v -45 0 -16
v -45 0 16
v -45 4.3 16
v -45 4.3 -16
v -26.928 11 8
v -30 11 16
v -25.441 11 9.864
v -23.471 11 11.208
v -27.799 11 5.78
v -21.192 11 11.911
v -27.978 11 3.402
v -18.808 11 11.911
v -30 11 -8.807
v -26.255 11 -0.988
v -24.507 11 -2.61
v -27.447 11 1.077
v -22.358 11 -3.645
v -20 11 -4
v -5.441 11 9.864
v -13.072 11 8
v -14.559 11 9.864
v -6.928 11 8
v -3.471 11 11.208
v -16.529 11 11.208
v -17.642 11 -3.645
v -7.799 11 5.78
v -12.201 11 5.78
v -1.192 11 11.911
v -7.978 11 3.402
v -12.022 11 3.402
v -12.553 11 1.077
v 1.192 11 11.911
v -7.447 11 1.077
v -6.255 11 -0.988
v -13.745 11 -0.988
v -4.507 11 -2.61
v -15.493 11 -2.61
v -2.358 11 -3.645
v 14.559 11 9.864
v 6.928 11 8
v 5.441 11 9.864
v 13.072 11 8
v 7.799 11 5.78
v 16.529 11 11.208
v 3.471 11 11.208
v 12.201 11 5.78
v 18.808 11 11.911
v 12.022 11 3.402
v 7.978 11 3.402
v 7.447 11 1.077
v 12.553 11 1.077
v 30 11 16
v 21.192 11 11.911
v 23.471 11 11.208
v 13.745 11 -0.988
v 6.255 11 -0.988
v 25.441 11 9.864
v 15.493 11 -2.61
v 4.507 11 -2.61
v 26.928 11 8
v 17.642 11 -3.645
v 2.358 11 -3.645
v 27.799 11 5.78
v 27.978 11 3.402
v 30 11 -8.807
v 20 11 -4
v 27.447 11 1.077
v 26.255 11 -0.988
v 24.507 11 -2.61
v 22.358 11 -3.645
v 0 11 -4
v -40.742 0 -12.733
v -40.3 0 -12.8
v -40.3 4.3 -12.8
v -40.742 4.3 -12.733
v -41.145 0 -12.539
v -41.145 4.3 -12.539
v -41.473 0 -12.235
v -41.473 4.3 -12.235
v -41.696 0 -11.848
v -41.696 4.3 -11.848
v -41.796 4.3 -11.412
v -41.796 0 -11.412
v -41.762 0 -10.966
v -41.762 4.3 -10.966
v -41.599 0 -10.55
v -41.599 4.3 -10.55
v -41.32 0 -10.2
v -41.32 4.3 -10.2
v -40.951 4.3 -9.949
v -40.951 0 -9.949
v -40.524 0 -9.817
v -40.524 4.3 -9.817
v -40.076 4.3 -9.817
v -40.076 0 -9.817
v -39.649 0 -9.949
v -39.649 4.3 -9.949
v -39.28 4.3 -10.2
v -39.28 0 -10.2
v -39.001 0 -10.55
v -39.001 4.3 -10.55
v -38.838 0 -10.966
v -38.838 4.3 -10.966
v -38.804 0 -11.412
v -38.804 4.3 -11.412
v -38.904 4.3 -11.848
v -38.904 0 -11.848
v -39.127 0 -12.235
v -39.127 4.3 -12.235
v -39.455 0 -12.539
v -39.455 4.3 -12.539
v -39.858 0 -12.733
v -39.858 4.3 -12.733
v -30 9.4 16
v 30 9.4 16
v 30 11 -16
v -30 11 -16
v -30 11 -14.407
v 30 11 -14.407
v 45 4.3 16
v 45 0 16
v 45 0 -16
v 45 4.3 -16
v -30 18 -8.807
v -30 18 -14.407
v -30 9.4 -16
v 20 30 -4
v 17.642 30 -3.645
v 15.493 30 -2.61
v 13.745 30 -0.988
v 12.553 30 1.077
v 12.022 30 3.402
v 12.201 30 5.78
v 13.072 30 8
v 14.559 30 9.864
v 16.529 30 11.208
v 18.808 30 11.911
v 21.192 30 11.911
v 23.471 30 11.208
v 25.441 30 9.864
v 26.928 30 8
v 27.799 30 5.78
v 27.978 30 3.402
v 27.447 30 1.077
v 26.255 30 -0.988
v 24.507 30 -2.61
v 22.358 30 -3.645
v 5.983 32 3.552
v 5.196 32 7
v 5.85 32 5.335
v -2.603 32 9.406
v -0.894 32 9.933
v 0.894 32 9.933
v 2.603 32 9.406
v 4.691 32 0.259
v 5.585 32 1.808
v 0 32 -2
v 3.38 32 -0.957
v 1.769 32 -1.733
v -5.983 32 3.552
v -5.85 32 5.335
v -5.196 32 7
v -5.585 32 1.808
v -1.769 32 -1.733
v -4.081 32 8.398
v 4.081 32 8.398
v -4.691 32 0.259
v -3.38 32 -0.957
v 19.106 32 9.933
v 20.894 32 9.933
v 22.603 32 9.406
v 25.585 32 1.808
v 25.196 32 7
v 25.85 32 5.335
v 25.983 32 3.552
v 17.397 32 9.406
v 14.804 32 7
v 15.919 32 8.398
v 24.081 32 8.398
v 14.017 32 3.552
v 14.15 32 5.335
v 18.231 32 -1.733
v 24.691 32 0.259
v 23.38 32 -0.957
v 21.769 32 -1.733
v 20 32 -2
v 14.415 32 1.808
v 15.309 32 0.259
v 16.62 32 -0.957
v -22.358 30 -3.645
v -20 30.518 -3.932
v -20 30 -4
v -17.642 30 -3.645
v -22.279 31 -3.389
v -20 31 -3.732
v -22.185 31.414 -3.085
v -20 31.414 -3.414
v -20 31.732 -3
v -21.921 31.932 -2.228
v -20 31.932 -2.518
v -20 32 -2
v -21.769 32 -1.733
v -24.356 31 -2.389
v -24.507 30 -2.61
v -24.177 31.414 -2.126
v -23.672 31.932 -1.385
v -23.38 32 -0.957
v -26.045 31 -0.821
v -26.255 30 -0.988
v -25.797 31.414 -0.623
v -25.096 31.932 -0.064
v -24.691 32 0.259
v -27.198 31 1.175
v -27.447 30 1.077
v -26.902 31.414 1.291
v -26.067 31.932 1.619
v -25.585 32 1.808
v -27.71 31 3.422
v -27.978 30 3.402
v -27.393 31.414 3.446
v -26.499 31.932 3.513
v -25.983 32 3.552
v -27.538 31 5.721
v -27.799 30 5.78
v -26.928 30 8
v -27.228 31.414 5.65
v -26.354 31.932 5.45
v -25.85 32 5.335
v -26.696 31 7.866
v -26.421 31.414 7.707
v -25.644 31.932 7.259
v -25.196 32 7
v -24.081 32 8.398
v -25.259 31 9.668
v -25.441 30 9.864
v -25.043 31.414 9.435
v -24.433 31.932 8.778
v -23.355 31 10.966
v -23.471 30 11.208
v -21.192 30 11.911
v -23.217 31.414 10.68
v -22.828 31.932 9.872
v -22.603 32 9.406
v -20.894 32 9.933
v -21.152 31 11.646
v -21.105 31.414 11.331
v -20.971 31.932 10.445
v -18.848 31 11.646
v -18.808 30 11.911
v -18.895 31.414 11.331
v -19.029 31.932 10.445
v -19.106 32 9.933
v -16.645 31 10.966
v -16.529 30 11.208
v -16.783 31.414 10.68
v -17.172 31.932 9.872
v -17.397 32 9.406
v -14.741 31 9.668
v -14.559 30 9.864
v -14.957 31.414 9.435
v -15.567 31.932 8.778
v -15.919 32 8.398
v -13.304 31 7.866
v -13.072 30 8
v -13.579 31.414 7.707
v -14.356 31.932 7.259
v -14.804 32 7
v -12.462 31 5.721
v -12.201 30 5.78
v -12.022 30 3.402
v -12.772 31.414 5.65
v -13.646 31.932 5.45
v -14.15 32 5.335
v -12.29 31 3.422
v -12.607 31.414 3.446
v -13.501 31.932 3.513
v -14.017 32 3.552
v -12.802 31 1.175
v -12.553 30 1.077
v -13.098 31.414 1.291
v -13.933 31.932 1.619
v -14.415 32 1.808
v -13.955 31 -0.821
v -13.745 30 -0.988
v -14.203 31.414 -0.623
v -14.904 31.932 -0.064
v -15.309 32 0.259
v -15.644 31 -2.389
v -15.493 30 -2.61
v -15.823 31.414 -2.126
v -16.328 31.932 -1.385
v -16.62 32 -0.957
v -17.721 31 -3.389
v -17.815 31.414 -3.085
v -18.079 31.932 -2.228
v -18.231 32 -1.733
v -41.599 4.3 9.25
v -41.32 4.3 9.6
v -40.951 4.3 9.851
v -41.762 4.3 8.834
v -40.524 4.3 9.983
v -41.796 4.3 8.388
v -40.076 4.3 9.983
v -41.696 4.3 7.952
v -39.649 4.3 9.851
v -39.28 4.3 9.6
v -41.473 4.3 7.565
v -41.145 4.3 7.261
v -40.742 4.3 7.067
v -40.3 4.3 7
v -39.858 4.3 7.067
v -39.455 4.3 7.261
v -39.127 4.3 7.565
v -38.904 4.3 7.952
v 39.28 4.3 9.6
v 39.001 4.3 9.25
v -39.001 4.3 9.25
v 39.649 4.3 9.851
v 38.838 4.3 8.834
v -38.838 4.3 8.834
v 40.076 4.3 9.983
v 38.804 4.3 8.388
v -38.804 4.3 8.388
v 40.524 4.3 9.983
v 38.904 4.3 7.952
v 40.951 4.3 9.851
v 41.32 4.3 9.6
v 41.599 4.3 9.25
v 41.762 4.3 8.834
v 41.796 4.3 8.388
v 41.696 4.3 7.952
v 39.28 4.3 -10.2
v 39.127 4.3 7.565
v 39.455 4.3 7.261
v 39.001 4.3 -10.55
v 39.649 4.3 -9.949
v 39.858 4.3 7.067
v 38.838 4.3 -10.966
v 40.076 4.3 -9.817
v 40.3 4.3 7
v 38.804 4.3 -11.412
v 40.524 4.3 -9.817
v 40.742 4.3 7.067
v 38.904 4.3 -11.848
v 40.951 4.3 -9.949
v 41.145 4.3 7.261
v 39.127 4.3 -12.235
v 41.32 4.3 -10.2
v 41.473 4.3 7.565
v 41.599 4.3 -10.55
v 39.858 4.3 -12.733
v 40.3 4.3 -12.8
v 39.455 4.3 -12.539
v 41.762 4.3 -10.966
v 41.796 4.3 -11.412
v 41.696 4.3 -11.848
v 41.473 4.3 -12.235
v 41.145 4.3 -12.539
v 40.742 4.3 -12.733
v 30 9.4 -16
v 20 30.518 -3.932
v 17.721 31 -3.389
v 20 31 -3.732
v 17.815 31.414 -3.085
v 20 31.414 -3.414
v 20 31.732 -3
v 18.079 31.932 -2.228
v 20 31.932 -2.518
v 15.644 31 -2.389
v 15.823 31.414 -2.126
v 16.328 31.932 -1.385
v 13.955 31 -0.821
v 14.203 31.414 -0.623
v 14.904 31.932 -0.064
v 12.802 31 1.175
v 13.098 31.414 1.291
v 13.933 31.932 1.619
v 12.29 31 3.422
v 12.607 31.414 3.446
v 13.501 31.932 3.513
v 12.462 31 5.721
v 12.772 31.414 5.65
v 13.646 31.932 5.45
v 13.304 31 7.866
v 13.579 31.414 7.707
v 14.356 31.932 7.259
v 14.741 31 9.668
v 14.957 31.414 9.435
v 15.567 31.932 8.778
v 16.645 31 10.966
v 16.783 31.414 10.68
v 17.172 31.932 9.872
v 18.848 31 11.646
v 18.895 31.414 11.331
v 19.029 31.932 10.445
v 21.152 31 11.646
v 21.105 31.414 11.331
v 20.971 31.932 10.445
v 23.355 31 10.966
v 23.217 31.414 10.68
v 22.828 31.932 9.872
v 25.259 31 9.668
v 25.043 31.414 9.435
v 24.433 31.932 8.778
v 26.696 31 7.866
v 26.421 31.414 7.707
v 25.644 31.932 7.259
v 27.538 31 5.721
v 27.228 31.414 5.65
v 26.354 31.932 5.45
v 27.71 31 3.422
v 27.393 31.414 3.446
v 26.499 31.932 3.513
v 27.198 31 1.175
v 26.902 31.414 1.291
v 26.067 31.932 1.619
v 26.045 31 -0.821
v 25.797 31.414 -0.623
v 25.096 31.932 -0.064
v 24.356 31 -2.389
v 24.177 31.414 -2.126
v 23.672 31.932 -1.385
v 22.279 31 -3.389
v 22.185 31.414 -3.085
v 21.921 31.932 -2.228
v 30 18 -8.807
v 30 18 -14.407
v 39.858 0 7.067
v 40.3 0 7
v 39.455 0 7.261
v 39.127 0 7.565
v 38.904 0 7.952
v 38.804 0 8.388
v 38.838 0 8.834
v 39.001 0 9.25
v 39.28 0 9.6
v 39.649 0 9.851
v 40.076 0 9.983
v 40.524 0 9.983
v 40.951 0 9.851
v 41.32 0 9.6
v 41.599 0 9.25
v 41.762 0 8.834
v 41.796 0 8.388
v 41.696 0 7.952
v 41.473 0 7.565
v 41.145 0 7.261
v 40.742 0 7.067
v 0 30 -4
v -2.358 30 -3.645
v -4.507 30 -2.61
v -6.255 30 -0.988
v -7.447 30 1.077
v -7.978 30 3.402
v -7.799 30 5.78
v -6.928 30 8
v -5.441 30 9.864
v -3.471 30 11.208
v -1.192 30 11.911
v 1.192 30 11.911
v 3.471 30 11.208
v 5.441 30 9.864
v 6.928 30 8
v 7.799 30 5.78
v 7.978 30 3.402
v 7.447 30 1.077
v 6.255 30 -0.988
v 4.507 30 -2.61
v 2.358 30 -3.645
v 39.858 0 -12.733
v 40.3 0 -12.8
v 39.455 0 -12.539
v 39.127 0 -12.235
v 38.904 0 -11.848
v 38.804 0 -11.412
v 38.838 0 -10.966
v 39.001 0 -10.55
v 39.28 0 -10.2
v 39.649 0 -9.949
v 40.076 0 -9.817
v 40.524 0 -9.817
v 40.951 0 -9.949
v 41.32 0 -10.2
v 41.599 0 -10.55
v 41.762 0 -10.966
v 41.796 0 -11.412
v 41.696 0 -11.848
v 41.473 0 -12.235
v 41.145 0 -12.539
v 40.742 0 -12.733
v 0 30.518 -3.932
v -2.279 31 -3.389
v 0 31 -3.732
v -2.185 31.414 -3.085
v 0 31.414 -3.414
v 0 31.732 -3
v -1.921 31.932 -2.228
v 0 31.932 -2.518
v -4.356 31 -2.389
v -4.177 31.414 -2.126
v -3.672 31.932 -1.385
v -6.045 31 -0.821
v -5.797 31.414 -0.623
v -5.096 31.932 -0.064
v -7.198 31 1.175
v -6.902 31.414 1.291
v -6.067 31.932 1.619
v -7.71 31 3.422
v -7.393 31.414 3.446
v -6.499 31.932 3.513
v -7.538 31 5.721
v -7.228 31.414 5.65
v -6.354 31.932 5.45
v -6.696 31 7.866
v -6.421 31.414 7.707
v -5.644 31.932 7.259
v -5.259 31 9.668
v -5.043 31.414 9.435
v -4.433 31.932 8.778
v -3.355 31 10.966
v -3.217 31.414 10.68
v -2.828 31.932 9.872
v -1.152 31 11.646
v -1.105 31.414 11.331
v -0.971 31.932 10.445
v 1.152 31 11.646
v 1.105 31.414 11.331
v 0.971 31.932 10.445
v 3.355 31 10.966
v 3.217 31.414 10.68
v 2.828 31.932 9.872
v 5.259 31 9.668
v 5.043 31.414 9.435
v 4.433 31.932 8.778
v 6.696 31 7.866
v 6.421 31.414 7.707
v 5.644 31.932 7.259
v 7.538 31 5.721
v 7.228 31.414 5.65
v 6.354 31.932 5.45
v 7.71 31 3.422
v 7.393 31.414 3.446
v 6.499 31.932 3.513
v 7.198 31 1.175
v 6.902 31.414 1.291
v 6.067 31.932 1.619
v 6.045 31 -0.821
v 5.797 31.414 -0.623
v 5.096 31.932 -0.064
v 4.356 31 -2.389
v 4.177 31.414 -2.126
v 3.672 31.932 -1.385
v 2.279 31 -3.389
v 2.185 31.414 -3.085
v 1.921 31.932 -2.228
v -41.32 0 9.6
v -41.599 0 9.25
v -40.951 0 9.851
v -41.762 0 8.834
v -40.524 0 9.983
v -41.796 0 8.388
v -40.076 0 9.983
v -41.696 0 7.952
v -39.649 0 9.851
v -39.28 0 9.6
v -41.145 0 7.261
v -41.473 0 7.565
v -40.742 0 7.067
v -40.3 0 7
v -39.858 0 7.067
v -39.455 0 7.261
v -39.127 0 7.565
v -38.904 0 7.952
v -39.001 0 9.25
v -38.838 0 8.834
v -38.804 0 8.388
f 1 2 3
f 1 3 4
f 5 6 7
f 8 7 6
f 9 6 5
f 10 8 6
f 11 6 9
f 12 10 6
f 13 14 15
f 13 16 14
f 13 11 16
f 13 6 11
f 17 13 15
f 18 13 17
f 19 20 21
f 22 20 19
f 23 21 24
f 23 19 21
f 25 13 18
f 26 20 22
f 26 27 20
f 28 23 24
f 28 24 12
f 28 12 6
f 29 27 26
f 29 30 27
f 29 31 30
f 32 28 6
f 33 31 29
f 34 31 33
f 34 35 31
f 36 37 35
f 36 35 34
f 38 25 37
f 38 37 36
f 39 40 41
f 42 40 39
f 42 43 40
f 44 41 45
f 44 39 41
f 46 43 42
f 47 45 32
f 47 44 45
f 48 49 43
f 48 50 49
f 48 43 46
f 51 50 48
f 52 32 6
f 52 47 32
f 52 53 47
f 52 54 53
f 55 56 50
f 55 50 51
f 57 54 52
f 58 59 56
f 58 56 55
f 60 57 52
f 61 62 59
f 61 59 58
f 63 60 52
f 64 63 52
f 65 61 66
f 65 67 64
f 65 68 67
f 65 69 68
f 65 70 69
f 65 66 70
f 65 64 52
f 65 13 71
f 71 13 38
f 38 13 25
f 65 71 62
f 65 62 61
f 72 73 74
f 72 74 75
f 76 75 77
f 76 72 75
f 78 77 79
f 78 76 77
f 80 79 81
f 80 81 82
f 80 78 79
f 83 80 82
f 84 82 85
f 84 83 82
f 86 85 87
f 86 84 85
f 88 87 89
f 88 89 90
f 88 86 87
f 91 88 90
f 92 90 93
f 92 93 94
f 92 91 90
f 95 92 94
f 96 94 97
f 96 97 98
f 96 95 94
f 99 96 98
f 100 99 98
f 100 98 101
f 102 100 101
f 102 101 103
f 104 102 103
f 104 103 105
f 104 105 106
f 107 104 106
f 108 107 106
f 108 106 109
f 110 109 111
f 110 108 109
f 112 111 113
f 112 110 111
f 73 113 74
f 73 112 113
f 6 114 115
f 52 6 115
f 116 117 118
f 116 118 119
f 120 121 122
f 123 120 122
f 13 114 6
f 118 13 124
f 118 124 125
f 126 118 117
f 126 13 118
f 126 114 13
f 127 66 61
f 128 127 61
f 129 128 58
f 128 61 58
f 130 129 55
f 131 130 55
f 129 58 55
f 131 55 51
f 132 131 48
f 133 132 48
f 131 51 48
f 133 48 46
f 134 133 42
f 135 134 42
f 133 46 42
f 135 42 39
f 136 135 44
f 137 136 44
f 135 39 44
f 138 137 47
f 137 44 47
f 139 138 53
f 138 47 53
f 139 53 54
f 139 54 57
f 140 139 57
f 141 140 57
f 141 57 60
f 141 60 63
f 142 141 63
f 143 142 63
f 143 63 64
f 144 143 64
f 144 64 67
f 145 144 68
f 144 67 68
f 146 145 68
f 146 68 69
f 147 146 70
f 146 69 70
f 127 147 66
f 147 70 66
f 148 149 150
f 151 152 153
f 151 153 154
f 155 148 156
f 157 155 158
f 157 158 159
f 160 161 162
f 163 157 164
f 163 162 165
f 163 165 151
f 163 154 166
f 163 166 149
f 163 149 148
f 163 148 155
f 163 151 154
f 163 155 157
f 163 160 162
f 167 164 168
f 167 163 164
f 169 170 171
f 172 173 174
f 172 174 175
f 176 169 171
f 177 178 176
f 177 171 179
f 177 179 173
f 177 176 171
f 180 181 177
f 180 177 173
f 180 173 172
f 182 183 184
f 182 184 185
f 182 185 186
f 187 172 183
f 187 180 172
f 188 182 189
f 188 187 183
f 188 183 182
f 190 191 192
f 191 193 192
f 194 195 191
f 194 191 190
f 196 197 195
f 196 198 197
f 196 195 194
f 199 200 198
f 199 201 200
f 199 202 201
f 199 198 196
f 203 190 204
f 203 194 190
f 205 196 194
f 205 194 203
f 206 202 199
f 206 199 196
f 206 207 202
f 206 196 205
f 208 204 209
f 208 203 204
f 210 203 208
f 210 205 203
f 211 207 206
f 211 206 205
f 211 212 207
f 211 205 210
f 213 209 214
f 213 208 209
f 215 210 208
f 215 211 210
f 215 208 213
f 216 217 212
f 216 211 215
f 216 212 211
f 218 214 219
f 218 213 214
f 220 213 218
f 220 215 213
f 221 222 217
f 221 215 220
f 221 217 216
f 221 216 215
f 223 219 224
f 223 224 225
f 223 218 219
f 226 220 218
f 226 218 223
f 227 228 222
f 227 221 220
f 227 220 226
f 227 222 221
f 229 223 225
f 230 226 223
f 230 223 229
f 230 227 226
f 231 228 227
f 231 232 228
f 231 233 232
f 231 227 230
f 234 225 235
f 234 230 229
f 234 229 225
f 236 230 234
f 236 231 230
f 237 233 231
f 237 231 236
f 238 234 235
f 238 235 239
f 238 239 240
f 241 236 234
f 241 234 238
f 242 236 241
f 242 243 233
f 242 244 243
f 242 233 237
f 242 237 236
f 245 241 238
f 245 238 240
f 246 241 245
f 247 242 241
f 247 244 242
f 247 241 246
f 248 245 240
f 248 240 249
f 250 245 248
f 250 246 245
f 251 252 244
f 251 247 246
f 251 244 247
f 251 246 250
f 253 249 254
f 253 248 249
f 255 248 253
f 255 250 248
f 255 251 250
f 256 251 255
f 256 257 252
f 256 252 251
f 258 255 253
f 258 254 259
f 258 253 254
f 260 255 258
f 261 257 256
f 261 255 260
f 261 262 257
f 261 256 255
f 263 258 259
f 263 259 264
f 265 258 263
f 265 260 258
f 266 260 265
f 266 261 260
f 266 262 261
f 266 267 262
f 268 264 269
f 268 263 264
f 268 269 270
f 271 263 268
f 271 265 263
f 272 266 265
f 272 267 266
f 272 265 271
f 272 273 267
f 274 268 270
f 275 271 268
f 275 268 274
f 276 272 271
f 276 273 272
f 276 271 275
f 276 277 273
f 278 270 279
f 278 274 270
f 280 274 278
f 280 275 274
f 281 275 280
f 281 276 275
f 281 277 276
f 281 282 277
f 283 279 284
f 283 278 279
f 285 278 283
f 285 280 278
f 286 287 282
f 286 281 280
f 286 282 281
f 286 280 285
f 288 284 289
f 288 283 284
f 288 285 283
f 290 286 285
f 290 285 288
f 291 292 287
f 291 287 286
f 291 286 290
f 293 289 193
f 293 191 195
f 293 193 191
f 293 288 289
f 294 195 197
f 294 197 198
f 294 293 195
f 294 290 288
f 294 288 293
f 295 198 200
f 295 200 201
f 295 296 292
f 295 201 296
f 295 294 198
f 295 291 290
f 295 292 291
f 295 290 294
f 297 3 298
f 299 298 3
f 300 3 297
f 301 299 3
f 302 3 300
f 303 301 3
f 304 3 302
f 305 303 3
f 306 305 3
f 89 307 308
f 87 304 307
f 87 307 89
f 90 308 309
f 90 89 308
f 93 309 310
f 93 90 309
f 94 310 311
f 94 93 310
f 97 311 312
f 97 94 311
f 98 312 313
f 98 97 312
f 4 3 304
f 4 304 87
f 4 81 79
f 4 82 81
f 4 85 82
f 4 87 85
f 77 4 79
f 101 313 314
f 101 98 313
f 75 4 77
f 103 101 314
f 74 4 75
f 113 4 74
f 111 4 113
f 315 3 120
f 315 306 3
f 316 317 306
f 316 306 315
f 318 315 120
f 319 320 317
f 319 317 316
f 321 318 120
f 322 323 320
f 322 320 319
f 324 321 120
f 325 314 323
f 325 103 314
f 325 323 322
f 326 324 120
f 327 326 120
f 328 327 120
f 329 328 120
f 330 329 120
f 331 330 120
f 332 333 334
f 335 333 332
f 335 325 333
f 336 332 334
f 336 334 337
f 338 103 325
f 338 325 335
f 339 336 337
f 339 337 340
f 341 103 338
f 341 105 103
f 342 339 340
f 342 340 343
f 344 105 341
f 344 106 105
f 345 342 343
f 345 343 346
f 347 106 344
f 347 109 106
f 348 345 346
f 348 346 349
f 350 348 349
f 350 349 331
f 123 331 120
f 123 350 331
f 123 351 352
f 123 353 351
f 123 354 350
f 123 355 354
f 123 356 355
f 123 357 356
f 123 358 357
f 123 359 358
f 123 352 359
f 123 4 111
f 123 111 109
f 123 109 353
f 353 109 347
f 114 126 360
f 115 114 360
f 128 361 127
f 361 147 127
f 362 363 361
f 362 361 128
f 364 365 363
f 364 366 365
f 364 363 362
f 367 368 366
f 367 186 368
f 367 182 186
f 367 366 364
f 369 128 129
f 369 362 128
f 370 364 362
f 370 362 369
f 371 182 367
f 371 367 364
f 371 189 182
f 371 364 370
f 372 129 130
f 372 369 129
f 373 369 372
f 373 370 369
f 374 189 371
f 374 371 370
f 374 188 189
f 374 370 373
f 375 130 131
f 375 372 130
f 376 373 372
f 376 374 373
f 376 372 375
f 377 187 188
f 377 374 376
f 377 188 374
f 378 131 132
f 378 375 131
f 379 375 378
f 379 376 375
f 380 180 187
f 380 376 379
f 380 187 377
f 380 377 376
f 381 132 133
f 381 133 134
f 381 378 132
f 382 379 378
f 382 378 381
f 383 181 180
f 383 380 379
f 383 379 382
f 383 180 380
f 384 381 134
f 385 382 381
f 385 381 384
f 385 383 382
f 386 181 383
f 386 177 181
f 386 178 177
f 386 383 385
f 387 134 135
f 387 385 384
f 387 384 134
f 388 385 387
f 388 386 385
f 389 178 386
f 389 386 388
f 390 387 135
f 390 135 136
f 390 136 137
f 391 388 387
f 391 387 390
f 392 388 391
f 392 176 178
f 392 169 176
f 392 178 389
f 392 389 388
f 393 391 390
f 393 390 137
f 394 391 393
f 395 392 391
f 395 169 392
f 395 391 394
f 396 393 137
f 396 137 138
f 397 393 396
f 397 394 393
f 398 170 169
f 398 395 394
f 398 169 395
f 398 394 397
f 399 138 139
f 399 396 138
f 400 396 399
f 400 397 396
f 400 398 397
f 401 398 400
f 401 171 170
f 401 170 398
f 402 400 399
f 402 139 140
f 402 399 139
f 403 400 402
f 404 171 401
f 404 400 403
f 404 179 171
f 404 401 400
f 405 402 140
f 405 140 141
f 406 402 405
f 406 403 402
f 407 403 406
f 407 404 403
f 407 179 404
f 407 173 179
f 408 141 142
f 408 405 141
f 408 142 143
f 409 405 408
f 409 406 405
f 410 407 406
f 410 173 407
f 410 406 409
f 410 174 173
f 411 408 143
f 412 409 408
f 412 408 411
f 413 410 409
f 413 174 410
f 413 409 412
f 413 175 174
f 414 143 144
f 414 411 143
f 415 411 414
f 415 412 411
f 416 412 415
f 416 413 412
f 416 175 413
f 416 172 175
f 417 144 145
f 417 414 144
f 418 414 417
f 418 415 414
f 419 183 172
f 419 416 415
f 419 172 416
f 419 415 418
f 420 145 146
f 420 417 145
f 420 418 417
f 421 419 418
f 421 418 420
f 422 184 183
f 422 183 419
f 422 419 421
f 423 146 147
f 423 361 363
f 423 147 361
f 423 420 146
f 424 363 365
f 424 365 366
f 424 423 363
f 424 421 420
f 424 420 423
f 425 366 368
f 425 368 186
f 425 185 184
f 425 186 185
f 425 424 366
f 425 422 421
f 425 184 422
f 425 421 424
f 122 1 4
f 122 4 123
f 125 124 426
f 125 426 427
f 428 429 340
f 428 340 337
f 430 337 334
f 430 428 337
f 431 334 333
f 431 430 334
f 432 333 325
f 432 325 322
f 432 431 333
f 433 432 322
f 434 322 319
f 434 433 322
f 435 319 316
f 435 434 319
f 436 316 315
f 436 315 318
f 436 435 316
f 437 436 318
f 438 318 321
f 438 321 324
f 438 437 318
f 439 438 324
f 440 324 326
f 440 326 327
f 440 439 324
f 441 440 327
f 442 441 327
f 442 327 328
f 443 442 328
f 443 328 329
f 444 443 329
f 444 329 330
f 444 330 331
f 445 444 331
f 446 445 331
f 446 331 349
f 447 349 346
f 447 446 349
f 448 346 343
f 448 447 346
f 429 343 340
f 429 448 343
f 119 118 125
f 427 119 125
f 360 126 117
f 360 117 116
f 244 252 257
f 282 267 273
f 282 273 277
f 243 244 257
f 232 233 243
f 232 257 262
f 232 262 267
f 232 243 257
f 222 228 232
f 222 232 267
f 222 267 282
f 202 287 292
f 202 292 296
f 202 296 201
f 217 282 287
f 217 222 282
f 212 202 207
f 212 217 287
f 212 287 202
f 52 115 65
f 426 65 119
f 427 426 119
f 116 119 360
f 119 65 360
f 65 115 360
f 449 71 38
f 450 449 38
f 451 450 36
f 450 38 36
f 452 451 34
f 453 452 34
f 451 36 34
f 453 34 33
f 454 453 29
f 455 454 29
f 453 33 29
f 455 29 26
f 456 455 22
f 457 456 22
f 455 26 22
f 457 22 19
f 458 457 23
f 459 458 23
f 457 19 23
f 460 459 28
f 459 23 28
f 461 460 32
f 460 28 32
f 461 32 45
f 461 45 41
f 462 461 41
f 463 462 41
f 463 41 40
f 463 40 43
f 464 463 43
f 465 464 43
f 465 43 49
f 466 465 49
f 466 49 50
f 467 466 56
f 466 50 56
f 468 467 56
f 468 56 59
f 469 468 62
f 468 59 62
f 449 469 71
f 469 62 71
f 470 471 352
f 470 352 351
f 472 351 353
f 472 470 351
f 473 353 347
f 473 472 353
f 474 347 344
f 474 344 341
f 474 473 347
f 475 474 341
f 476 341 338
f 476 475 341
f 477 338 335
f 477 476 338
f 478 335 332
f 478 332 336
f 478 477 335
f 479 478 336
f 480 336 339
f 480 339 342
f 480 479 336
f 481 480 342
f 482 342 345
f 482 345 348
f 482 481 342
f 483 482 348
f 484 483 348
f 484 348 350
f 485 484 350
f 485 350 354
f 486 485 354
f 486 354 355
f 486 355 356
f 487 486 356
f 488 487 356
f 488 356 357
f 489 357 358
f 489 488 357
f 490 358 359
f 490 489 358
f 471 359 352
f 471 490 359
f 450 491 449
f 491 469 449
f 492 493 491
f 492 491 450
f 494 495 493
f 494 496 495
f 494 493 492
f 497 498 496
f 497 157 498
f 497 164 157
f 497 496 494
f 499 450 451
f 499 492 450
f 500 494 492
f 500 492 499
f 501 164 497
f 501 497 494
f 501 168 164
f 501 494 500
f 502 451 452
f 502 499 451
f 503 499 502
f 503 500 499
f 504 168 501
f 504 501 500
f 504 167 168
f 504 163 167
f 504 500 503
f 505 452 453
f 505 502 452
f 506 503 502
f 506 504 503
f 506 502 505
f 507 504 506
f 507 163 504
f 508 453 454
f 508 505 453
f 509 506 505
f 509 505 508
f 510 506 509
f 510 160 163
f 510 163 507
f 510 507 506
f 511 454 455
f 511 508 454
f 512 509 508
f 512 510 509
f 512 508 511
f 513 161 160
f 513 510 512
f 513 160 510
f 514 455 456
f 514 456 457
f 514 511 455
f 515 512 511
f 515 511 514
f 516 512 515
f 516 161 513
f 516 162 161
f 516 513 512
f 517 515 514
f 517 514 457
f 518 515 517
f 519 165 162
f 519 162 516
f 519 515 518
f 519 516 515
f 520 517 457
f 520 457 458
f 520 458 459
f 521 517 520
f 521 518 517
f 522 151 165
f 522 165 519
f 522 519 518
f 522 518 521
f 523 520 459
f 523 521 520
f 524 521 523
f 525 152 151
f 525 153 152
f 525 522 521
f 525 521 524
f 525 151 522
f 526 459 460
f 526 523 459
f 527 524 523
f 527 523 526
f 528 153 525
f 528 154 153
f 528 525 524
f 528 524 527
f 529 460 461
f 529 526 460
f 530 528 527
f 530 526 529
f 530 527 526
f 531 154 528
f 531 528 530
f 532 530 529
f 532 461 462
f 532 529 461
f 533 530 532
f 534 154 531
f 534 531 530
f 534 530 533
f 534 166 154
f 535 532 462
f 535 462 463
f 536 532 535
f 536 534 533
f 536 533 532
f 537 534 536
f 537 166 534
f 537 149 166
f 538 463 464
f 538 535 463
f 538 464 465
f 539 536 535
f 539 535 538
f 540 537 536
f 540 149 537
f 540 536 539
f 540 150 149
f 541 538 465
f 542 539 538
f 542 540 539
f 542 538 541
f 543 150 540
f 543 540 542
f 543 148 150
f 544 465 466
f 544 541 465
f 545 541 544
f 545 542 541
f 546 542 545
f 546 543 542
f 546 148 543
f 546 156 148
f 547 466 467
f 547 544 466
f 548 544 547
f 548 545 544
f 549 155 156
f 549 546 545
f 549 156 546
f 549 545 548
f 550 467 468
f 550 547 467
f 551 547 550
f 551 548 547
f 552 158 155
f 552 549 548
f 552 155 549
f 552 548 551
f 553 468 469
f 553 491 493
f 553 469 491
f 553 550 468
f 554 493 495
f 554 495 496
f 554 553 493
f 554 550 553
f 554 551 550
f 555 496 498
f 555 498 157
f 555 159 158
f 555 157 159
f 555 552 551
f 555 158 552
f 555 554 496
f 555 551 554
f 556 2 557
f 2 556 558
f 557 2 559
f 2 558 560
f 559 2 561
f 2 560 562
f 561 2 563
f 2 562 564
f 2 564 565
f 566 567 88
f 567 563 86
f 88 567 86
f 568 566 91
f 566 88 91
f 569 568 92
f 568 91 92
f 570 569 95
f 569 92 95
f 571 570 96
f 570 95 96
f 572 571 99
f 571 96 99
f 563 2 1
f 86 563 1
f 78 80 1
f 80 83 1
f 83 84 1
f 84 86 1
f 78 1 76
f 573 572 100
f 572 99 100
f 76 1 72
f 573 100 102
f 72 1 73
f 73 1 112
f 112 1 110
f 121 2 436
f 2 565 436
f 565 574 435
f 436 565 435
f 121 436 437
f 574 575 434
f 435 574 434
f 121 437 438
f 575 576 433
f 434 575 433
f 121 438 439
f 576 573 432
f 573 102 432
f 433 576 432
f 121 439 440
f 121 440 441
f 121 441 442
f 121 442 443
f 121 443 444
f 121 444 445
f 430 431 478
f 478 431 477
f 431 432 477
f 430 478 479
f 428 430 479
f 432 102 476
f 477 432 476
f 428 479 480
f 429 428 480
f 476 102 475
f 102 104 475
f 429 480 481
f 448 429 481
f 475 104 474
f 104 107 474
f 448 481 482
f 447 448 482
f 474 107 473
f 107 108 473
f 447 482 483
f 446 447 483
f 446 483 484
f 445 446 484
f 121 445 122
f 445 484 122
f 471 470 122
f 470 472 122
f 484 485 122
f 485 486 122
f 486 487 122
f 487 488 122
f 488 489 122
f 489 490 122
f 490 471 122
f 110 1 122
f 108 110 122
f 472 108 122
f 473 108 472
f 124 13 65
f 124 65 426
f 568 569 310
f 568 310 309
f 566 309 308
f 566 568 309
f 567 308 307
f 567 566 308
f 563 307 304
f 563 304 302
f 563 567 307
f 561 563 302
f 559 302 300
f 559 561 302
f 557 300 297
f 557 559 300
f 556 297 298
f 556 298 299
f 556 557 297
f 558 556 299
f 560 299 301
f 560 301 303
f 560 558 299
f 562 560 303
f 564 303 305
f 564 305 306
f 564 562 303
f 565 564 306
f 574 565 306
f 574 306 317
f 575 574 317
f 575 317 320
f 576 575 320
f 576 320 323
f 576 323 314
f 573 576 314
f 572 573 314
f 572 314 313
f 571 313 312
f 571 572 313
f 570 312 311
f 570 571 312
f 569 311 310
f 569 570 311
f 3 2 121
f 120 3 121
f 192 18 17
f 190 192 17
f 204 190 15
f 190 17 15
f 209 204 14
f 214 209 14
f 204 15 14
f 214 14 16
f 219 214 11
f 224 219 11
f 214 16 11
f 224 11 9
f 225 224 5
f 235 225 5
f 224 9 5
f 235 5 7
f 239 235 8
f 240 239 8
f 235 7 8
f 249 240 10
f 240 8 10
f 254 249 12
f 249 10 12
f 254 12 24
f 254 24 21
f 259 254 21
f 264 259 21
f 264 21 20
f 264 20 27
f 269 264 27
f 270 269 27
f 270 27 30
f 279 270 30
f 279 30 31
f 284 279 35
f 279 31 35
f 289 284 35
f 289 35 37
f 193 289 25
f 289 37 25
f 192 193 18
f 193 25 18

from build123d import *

# Parameters (mm, degrees)
SKETCH2_W                = 90
SKETCH2_H                = 32
SKETCH2_R                = 1.5
BOSS_EXTRUDE1_DEPTH      = 4.3
SKETCH3_W                = 60
SKETCH3_H                = 32
BOSS_EXTRUDE2_DEPTH      = 1.6
SKETCH4_R                = 8
BOSS_EXTRUDE3_DEPTH      = 21
FILLET1_R                = 2
BOSS_EXTRUDE4_DEPTH      = 30
BOSS_EXTRUDE4_DEPTH_BACK = 30
SKETCH5_W                = 5.6
SKETCH5_H                = 7


with BuildPart() as part:
    # Sketch2 → Boss-Extrude1 (new body)
    with BuildSketch(Plane(origin=(0, 0, 0), x_dir=(1, 0, 0), z_dir=(0, 1, 0))):
        Rectangle(SKETCH2_W, SKETCH2_H)
        with Locations(Location((40.3, 11.3, 0), (0, 0, 90))):
            Circle(SKETCH2_R, mode=Mode.SUBTRACT)
        with Locations(Location((40.3, -8.5, 0), (0, 0, 90))):
            Circle(SKETCH2_R, mode=Mode.SUBTRACT)
        with Locations(Location((-40.3, -8.5, 0), (0, 0, 90))):
            Circle(SKETCH2_R, mode=Mode.SUBTRACT)
        with Locations(Location((-40.3, 11.3, 0), (0, 0, 90))):
            Circle(SKETCH2_R, mode=Mode.SUBTRACT)
    extrude(amount=BOSS_EXTRUDE1_DEPTH)


with BuildPart() as body_2:
    # Sketch3 → Boss-Extrude2 (new body)
    with BuildSketch(Plane(origin=(0, 9.4, 0), x_dir=(1, 0, 0), z_dir=(0, 1, 0))):
        Rectangle(SKETCH3_W, SKETCH3_H)
    extrude(amount=BOSS_EXTRUDE2_DEPTH)

    # Sketch4 → Boss-Extrude3 (add)
    with BuildSketch(Plane(origin=(0, 11, 0), x_dir=(1, 0, 0), z_dir=(0, 1, 0))):
        with Locations(Location((20, -4, 0), (0, 0, 90))):
            Circle(SKETCH4_R)
        with Locations(Location((0, -4, 0), (0, 0, 90))):
            Circle(SKETCH4_R)
        with Locations(Location((-20, -4, 0), (0, 0, 90))):
            Circle(SKETCH4_R)
    extrude(amount=BOSS_EXTRUDE3_DEPTH)

    # Fillet1
    fillet1_edges = [body_2.edges().sort_by_distance(p)[0] for p in [
        (20, 32, 12),
        (-20, 32, 12),
        (0, 32, 12),
    ]]
    fillet(fillet1_edges, radius=FILLET1_R)

    # Sketch5 → Boss-Extrude4 (add, two sides: drawn at the far end of the back side and taken through both)
    with BuildSketch(Plane(origin=(0, 0, 0), x_dir=(0, 0, -1), z_dir=(1, 0, 0)).offset(-BOSS_EXTRUDE4_DEPTH_BACK)):
        with Locations((11.607185034, 14.5)):
            Rectangle(SKETCH5_W, SKETCH5_H)
    extrude(amount=BOSS_EXTRUDE4_DEPTH + BOSS_EXTRUDE4_DEPTH_BACK)


solid = Compound([part.part, body_2.part])
